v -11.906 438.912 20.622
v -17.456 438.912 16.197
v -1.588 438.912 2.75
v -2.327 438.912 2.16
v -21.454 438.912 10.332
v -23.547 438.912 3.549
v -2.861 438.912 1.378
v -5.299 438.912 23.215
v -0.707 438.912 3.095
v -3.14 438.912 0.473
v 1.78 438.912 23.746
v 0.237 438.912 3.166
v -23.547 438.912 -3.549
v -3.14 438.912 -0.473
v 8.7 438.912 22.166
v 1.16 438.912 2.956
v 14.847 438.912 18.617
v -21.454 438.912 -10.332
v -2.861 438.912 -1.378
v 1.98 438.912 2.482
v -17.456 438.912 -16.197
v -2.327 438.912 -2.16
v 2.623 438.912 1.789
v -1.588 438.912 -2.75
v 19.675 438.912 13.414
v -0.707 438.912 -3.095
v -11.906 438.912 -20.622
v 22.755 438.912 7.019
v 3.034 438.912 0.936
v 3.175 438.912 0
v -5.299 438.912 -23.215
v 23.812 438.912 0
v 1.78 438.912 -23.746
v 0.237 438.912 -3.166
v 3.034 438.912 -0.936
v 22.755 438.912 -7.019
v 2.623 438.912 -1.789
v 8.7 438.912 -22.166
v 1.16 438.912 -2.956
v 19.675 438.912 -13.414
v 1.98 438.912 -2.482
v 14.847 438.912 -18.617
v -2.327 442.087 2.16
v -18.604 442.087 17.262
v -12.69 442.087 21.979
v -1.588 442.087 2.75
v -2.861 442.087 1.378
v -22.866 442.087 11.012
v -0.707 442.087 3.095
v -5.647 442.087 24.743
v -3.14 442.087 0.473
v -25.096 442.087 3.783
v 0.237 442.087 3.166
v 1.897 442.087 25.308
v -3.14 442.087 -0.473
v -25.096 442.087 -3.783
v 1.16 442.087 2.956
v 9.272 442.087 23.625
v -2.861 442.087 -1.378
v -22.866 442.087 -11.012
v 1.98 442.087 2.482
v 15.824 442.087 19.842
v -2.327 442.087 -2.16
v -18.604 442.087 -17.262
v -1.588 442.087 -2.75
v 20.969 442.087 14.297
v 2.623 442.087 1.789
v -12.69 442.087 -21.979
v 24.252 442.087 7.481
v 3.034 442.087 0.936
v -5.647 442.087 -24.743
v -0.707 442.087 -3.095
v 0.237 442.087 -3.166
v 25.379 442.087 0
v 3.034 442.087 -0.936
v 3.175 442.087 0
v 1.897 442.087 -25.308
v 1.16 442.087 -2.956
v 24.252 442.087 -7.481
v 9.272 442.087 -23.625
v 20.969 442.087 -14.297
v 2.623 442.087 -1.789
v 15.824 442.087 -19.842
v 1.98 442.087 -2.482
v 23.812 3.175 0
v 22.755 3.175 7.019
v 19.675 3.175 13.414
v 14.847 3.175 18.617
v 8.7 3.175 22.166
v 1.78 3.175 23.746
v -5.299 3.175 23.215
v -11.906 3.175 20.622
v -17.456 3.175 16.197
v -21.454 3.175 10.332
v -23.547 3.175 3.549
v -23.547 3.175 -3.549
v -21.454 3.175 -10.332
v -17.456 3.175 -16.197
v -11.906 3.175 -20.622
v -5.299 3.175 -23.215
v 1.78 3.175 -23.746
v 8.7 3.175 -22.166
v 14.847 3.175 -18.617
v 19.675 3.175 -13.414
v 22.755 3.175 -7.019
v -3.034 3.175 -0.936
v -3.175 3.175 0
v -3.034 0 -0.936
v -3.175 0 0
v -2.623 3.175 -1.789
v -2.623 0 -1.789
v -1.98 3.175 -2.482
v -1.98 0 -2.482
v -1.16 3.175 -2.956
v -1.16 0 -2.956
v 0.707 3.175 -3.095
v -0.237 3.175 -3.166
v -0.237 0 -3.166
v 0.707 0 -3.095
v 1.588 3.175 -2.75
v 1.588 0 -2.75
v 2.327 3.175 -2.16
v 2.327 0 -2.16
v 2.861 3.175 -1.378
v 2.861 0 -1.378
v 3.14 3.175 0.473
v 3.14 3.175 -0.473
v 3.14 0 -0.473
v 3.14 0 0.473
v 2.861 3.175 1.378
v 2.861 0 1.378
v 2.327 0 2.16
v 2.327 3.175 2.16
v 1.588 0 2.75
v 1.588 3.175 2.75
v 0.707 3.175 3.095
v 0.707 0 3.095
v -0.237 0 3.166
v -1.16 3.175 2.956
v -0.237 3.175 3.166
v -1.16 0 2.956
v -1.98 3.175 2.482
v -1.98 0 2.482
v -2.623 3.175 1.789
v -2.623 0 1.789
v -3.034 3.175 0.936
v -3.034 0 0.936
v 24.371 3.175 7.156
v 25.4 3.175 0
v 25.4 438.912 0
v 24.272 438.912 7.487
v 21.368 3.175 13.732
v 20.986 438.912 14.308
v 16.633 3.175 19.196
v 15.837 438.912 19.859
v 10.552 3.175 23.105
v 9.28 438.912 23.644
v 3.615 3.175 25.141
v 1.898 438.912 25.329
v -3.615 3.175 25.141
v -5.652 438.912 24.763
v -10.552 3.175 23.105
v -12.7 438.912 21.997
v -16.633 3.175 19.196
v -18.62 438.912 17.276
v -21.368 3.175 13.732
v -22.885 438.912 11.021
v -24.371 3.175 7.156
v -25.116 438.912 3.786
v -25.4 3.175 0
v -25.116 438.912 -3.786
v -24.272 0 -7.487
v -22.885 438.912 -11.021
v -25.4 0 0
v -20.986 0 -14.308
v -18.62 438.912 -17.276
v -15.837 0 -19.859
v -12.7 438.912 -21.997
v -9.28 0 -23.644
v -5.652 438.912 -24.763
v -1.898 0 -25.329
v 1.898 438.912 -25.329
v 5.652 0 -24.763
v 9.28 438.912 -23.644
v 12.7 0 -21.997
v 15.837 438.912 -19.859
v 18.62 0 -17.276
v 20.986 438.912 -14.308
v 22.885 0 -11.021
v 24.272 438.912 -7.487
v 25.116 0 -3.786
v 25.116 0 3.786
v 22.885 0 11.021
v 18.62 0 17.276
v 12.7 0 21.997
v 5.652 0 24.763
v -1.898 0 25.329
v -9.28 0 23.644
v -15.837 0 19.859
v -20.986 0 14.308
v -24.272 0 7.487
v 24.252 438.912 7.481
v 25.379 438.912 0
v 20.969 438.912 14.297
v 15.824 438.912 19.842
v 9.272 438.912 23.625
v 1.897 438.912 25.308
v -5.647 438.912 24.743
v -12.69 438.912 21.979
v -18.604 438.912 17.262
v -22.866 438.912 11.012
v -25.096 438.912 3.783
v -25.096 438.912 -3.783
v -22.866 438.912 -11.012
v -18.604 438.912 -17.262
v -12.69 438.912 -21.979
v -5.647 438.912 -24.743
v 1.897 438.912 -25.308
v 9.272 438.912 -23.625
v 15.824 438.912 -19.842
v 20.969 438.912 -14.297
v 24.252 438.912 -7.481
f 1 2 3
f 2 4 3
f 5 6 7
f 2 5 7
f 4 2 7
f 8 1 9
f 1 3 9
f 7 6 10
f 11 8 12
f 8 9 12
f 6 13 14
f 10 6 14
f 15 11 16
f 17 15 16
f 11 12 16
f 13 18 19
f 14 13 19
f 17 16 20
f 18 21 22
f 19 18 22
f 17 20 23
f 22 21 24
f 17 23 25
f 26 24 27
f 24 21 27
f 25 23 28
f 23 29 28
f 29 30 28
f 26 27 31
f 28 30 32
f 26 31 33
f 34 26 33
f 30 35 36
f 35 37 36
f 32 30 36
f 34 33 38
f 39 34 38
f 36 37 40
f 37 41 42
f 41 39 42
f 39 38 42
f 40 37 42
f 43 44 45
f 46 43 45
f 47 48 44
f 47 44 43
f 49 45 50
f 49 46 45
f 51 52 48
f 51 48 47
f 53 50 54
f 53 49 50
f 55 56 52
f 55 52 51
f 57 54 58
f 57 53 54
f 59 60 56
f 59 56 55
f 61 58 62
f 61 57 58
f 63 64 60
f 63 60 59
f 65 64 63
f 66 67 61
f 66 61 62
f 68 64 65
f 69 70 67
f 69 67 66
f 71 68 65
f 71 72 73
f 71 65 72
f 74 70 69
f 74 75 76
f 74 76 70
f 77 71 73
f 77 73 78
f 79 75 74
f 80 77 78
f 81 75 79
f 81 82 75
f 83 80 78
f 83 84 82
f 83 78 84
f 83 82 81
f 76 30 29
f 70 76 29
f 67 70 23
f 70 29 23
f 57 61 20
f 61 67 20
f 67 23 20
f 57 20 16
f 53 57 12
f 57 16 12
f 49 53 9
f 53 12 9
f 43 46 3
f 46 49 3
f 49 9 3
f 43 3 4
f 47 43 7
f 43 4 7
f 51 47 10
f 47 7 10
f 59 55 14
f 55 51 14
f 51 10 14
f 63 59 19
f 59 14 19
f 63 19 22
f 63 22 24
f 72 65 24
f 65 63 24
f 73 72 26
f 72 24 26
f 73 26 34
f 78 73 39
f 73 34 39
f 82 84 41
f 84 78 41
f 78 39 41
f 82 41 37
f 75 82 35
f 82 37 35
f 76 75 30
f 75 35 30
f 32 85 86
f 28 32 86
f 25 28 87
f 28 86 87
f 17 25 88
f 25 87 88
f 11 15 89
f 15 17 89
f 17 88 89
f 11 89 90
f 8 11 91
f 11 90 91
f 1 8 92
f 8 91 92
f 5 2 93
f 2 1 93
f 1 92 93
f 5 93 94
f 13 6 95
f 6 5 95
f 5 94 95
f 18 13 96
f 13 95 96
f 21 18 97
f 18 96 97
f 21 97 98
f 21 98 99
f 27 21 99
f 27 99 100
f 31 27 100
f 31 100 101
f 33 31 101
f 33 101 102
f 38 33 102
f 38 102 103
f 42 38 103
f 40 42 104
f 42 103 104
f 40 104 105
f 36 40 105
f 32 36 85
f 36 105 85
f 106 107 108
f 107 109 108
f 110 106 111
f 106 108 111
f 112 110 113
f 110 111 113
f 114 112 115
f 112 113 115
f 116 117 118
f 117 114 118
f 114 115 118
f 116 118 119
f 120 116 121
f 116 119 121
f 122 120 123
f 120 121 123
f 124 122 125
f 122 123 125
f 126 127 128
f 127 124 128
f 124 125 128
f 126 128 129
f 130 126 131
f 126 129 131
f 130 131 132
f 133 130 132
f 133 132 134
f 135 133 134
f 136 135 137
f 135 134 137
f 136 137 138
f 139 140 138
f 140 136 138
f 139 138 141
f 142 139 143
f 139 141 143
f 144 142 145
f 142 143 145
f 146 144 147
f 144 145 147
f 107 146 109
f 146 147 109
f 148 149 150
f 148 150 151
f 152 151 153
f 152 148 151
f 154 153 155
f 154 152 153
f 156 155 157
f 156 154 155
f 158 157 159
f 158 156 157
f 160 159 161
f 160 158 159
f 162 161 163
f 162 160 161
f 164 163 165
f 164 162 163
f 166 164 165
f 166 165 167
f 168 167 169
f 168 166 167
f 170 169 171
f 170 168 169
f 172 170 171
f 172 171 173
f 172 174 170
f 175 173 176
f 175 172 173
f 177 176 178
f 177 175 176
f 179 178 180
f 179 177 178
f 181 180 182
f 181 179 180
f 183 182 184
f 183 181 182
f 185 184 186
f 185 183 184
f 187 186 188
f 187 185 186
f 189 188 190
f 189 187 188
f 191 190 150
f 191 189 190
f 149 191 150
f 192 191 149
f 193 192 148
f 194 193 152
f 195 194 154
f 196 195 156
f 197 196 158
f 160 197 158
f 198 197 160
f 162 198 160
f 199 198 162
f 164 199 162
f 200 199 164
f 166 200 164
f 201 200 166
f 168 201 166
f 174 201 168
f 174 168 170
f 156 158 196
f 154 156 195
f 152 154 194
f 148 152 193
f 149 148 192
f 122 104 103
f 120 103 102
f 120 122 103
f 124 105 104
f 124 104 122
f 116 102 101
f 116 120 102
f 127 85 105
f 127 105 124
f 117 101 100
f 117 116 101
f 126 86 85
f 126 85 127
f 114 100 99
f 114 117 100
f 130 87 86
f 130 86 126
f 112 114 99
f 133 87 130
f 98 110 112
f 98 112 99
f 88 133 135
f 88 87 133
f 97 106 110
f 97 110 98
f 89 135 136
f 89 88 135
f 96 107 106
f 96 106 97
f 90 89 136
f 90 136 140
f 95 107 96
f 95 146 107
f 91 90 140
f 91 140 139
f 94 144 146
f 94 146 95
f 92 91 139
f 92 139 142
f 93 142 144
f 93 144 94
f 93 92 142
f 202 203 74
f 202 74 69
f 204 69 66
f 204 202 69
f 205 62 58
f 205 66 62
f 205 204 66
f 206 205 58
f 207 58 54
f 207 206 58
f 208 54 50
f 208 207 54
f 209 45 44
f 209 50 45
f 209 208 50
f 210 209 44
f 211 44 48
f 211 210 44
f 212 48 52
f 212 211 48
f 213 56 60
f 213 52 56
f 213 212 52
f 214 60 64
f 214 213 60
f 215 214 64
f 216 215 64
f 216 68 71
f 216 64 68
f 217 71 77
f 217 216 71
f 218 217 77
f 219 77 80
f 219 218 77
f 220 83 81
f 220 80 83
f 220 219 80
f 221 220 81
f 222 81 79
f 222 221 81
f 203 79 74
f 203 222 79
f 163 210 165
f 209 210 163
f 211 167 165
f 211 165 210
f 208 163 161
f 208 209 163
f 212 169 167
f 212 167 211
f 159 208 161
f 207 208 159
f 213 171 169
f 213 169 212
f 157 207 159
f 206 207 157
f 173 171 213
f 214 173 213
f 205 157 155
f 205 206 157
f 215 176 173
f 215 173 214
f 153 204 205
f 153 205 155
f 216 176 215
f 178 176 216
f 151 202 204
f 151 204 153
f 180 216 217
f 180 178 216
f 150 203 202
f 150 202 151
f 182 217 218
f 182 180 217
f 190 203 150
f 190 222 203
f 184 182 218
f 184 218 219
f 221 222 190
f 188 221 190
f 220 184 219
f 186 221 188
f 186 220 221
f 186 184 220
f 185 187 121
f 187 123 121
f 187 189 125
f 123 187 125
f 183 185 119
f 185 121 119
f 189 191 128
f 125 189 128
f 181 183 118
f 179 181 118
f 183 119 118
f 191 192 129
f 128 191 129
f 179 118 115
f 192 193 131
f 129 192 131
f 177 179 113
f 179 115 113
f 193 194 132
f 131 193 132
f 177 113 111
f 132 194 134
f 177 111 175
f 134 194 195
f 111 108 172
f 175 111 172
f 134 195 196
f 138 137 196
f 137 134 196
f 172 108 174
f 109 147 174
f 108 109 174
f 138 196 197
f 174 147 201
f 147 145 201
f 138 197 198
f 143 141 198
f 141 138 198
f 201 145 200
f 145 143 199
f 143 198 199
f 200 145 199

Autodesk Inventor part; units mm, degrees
ref_plane "YZ Plane" through (0, 0, 0) normal (1, 0, 0) x (0, 1, 0)
ref_plane "XZ Plane" through (0, 0, 0) normal (0, 1, 0) x (-1, 0, 0)
ref_plane "XY Plane" through (0, 0, 0) normal (0, 0, 1) x (1, 0, 0)
sketch "Sketch1" plane through (0, 0, 0) normal (0, 1, 0) x (-1, 0, 0)
  circle A0 centre (0, 0) radius 25.4
  circle A1 centre (0, 0) radius 3.175
  dimension "d0" = 50.8
  dimension "d1" = 6.35
extrude "Extrusion1" add sketch "Sketch1" along normal blind 3.175
sketch "Sketch2" plane through (0, 3.175, 0) normal (0, 1, 0) x (1, 0, 0)
  circle A0 centre (0, 0) radius 23.8125
  circle A1 centre (0, 0) radius 25.4
  dimension "d4" = 47.625
extrude "Extrusion2" add sketch "Sketch2" along normal blind 435.737
sketch "Sketch3" plane through (0, 438.912, 0) normal (0, 1, 0) x (1, 0, 0)
  circle A0 centre (0, 0) radius 25.3794
  circle A1 centre (0, 0) radius 3.175
extrude "Extrusion3" add sketch "Sketch3" along normal blind 3.175
properties part number "roller"
